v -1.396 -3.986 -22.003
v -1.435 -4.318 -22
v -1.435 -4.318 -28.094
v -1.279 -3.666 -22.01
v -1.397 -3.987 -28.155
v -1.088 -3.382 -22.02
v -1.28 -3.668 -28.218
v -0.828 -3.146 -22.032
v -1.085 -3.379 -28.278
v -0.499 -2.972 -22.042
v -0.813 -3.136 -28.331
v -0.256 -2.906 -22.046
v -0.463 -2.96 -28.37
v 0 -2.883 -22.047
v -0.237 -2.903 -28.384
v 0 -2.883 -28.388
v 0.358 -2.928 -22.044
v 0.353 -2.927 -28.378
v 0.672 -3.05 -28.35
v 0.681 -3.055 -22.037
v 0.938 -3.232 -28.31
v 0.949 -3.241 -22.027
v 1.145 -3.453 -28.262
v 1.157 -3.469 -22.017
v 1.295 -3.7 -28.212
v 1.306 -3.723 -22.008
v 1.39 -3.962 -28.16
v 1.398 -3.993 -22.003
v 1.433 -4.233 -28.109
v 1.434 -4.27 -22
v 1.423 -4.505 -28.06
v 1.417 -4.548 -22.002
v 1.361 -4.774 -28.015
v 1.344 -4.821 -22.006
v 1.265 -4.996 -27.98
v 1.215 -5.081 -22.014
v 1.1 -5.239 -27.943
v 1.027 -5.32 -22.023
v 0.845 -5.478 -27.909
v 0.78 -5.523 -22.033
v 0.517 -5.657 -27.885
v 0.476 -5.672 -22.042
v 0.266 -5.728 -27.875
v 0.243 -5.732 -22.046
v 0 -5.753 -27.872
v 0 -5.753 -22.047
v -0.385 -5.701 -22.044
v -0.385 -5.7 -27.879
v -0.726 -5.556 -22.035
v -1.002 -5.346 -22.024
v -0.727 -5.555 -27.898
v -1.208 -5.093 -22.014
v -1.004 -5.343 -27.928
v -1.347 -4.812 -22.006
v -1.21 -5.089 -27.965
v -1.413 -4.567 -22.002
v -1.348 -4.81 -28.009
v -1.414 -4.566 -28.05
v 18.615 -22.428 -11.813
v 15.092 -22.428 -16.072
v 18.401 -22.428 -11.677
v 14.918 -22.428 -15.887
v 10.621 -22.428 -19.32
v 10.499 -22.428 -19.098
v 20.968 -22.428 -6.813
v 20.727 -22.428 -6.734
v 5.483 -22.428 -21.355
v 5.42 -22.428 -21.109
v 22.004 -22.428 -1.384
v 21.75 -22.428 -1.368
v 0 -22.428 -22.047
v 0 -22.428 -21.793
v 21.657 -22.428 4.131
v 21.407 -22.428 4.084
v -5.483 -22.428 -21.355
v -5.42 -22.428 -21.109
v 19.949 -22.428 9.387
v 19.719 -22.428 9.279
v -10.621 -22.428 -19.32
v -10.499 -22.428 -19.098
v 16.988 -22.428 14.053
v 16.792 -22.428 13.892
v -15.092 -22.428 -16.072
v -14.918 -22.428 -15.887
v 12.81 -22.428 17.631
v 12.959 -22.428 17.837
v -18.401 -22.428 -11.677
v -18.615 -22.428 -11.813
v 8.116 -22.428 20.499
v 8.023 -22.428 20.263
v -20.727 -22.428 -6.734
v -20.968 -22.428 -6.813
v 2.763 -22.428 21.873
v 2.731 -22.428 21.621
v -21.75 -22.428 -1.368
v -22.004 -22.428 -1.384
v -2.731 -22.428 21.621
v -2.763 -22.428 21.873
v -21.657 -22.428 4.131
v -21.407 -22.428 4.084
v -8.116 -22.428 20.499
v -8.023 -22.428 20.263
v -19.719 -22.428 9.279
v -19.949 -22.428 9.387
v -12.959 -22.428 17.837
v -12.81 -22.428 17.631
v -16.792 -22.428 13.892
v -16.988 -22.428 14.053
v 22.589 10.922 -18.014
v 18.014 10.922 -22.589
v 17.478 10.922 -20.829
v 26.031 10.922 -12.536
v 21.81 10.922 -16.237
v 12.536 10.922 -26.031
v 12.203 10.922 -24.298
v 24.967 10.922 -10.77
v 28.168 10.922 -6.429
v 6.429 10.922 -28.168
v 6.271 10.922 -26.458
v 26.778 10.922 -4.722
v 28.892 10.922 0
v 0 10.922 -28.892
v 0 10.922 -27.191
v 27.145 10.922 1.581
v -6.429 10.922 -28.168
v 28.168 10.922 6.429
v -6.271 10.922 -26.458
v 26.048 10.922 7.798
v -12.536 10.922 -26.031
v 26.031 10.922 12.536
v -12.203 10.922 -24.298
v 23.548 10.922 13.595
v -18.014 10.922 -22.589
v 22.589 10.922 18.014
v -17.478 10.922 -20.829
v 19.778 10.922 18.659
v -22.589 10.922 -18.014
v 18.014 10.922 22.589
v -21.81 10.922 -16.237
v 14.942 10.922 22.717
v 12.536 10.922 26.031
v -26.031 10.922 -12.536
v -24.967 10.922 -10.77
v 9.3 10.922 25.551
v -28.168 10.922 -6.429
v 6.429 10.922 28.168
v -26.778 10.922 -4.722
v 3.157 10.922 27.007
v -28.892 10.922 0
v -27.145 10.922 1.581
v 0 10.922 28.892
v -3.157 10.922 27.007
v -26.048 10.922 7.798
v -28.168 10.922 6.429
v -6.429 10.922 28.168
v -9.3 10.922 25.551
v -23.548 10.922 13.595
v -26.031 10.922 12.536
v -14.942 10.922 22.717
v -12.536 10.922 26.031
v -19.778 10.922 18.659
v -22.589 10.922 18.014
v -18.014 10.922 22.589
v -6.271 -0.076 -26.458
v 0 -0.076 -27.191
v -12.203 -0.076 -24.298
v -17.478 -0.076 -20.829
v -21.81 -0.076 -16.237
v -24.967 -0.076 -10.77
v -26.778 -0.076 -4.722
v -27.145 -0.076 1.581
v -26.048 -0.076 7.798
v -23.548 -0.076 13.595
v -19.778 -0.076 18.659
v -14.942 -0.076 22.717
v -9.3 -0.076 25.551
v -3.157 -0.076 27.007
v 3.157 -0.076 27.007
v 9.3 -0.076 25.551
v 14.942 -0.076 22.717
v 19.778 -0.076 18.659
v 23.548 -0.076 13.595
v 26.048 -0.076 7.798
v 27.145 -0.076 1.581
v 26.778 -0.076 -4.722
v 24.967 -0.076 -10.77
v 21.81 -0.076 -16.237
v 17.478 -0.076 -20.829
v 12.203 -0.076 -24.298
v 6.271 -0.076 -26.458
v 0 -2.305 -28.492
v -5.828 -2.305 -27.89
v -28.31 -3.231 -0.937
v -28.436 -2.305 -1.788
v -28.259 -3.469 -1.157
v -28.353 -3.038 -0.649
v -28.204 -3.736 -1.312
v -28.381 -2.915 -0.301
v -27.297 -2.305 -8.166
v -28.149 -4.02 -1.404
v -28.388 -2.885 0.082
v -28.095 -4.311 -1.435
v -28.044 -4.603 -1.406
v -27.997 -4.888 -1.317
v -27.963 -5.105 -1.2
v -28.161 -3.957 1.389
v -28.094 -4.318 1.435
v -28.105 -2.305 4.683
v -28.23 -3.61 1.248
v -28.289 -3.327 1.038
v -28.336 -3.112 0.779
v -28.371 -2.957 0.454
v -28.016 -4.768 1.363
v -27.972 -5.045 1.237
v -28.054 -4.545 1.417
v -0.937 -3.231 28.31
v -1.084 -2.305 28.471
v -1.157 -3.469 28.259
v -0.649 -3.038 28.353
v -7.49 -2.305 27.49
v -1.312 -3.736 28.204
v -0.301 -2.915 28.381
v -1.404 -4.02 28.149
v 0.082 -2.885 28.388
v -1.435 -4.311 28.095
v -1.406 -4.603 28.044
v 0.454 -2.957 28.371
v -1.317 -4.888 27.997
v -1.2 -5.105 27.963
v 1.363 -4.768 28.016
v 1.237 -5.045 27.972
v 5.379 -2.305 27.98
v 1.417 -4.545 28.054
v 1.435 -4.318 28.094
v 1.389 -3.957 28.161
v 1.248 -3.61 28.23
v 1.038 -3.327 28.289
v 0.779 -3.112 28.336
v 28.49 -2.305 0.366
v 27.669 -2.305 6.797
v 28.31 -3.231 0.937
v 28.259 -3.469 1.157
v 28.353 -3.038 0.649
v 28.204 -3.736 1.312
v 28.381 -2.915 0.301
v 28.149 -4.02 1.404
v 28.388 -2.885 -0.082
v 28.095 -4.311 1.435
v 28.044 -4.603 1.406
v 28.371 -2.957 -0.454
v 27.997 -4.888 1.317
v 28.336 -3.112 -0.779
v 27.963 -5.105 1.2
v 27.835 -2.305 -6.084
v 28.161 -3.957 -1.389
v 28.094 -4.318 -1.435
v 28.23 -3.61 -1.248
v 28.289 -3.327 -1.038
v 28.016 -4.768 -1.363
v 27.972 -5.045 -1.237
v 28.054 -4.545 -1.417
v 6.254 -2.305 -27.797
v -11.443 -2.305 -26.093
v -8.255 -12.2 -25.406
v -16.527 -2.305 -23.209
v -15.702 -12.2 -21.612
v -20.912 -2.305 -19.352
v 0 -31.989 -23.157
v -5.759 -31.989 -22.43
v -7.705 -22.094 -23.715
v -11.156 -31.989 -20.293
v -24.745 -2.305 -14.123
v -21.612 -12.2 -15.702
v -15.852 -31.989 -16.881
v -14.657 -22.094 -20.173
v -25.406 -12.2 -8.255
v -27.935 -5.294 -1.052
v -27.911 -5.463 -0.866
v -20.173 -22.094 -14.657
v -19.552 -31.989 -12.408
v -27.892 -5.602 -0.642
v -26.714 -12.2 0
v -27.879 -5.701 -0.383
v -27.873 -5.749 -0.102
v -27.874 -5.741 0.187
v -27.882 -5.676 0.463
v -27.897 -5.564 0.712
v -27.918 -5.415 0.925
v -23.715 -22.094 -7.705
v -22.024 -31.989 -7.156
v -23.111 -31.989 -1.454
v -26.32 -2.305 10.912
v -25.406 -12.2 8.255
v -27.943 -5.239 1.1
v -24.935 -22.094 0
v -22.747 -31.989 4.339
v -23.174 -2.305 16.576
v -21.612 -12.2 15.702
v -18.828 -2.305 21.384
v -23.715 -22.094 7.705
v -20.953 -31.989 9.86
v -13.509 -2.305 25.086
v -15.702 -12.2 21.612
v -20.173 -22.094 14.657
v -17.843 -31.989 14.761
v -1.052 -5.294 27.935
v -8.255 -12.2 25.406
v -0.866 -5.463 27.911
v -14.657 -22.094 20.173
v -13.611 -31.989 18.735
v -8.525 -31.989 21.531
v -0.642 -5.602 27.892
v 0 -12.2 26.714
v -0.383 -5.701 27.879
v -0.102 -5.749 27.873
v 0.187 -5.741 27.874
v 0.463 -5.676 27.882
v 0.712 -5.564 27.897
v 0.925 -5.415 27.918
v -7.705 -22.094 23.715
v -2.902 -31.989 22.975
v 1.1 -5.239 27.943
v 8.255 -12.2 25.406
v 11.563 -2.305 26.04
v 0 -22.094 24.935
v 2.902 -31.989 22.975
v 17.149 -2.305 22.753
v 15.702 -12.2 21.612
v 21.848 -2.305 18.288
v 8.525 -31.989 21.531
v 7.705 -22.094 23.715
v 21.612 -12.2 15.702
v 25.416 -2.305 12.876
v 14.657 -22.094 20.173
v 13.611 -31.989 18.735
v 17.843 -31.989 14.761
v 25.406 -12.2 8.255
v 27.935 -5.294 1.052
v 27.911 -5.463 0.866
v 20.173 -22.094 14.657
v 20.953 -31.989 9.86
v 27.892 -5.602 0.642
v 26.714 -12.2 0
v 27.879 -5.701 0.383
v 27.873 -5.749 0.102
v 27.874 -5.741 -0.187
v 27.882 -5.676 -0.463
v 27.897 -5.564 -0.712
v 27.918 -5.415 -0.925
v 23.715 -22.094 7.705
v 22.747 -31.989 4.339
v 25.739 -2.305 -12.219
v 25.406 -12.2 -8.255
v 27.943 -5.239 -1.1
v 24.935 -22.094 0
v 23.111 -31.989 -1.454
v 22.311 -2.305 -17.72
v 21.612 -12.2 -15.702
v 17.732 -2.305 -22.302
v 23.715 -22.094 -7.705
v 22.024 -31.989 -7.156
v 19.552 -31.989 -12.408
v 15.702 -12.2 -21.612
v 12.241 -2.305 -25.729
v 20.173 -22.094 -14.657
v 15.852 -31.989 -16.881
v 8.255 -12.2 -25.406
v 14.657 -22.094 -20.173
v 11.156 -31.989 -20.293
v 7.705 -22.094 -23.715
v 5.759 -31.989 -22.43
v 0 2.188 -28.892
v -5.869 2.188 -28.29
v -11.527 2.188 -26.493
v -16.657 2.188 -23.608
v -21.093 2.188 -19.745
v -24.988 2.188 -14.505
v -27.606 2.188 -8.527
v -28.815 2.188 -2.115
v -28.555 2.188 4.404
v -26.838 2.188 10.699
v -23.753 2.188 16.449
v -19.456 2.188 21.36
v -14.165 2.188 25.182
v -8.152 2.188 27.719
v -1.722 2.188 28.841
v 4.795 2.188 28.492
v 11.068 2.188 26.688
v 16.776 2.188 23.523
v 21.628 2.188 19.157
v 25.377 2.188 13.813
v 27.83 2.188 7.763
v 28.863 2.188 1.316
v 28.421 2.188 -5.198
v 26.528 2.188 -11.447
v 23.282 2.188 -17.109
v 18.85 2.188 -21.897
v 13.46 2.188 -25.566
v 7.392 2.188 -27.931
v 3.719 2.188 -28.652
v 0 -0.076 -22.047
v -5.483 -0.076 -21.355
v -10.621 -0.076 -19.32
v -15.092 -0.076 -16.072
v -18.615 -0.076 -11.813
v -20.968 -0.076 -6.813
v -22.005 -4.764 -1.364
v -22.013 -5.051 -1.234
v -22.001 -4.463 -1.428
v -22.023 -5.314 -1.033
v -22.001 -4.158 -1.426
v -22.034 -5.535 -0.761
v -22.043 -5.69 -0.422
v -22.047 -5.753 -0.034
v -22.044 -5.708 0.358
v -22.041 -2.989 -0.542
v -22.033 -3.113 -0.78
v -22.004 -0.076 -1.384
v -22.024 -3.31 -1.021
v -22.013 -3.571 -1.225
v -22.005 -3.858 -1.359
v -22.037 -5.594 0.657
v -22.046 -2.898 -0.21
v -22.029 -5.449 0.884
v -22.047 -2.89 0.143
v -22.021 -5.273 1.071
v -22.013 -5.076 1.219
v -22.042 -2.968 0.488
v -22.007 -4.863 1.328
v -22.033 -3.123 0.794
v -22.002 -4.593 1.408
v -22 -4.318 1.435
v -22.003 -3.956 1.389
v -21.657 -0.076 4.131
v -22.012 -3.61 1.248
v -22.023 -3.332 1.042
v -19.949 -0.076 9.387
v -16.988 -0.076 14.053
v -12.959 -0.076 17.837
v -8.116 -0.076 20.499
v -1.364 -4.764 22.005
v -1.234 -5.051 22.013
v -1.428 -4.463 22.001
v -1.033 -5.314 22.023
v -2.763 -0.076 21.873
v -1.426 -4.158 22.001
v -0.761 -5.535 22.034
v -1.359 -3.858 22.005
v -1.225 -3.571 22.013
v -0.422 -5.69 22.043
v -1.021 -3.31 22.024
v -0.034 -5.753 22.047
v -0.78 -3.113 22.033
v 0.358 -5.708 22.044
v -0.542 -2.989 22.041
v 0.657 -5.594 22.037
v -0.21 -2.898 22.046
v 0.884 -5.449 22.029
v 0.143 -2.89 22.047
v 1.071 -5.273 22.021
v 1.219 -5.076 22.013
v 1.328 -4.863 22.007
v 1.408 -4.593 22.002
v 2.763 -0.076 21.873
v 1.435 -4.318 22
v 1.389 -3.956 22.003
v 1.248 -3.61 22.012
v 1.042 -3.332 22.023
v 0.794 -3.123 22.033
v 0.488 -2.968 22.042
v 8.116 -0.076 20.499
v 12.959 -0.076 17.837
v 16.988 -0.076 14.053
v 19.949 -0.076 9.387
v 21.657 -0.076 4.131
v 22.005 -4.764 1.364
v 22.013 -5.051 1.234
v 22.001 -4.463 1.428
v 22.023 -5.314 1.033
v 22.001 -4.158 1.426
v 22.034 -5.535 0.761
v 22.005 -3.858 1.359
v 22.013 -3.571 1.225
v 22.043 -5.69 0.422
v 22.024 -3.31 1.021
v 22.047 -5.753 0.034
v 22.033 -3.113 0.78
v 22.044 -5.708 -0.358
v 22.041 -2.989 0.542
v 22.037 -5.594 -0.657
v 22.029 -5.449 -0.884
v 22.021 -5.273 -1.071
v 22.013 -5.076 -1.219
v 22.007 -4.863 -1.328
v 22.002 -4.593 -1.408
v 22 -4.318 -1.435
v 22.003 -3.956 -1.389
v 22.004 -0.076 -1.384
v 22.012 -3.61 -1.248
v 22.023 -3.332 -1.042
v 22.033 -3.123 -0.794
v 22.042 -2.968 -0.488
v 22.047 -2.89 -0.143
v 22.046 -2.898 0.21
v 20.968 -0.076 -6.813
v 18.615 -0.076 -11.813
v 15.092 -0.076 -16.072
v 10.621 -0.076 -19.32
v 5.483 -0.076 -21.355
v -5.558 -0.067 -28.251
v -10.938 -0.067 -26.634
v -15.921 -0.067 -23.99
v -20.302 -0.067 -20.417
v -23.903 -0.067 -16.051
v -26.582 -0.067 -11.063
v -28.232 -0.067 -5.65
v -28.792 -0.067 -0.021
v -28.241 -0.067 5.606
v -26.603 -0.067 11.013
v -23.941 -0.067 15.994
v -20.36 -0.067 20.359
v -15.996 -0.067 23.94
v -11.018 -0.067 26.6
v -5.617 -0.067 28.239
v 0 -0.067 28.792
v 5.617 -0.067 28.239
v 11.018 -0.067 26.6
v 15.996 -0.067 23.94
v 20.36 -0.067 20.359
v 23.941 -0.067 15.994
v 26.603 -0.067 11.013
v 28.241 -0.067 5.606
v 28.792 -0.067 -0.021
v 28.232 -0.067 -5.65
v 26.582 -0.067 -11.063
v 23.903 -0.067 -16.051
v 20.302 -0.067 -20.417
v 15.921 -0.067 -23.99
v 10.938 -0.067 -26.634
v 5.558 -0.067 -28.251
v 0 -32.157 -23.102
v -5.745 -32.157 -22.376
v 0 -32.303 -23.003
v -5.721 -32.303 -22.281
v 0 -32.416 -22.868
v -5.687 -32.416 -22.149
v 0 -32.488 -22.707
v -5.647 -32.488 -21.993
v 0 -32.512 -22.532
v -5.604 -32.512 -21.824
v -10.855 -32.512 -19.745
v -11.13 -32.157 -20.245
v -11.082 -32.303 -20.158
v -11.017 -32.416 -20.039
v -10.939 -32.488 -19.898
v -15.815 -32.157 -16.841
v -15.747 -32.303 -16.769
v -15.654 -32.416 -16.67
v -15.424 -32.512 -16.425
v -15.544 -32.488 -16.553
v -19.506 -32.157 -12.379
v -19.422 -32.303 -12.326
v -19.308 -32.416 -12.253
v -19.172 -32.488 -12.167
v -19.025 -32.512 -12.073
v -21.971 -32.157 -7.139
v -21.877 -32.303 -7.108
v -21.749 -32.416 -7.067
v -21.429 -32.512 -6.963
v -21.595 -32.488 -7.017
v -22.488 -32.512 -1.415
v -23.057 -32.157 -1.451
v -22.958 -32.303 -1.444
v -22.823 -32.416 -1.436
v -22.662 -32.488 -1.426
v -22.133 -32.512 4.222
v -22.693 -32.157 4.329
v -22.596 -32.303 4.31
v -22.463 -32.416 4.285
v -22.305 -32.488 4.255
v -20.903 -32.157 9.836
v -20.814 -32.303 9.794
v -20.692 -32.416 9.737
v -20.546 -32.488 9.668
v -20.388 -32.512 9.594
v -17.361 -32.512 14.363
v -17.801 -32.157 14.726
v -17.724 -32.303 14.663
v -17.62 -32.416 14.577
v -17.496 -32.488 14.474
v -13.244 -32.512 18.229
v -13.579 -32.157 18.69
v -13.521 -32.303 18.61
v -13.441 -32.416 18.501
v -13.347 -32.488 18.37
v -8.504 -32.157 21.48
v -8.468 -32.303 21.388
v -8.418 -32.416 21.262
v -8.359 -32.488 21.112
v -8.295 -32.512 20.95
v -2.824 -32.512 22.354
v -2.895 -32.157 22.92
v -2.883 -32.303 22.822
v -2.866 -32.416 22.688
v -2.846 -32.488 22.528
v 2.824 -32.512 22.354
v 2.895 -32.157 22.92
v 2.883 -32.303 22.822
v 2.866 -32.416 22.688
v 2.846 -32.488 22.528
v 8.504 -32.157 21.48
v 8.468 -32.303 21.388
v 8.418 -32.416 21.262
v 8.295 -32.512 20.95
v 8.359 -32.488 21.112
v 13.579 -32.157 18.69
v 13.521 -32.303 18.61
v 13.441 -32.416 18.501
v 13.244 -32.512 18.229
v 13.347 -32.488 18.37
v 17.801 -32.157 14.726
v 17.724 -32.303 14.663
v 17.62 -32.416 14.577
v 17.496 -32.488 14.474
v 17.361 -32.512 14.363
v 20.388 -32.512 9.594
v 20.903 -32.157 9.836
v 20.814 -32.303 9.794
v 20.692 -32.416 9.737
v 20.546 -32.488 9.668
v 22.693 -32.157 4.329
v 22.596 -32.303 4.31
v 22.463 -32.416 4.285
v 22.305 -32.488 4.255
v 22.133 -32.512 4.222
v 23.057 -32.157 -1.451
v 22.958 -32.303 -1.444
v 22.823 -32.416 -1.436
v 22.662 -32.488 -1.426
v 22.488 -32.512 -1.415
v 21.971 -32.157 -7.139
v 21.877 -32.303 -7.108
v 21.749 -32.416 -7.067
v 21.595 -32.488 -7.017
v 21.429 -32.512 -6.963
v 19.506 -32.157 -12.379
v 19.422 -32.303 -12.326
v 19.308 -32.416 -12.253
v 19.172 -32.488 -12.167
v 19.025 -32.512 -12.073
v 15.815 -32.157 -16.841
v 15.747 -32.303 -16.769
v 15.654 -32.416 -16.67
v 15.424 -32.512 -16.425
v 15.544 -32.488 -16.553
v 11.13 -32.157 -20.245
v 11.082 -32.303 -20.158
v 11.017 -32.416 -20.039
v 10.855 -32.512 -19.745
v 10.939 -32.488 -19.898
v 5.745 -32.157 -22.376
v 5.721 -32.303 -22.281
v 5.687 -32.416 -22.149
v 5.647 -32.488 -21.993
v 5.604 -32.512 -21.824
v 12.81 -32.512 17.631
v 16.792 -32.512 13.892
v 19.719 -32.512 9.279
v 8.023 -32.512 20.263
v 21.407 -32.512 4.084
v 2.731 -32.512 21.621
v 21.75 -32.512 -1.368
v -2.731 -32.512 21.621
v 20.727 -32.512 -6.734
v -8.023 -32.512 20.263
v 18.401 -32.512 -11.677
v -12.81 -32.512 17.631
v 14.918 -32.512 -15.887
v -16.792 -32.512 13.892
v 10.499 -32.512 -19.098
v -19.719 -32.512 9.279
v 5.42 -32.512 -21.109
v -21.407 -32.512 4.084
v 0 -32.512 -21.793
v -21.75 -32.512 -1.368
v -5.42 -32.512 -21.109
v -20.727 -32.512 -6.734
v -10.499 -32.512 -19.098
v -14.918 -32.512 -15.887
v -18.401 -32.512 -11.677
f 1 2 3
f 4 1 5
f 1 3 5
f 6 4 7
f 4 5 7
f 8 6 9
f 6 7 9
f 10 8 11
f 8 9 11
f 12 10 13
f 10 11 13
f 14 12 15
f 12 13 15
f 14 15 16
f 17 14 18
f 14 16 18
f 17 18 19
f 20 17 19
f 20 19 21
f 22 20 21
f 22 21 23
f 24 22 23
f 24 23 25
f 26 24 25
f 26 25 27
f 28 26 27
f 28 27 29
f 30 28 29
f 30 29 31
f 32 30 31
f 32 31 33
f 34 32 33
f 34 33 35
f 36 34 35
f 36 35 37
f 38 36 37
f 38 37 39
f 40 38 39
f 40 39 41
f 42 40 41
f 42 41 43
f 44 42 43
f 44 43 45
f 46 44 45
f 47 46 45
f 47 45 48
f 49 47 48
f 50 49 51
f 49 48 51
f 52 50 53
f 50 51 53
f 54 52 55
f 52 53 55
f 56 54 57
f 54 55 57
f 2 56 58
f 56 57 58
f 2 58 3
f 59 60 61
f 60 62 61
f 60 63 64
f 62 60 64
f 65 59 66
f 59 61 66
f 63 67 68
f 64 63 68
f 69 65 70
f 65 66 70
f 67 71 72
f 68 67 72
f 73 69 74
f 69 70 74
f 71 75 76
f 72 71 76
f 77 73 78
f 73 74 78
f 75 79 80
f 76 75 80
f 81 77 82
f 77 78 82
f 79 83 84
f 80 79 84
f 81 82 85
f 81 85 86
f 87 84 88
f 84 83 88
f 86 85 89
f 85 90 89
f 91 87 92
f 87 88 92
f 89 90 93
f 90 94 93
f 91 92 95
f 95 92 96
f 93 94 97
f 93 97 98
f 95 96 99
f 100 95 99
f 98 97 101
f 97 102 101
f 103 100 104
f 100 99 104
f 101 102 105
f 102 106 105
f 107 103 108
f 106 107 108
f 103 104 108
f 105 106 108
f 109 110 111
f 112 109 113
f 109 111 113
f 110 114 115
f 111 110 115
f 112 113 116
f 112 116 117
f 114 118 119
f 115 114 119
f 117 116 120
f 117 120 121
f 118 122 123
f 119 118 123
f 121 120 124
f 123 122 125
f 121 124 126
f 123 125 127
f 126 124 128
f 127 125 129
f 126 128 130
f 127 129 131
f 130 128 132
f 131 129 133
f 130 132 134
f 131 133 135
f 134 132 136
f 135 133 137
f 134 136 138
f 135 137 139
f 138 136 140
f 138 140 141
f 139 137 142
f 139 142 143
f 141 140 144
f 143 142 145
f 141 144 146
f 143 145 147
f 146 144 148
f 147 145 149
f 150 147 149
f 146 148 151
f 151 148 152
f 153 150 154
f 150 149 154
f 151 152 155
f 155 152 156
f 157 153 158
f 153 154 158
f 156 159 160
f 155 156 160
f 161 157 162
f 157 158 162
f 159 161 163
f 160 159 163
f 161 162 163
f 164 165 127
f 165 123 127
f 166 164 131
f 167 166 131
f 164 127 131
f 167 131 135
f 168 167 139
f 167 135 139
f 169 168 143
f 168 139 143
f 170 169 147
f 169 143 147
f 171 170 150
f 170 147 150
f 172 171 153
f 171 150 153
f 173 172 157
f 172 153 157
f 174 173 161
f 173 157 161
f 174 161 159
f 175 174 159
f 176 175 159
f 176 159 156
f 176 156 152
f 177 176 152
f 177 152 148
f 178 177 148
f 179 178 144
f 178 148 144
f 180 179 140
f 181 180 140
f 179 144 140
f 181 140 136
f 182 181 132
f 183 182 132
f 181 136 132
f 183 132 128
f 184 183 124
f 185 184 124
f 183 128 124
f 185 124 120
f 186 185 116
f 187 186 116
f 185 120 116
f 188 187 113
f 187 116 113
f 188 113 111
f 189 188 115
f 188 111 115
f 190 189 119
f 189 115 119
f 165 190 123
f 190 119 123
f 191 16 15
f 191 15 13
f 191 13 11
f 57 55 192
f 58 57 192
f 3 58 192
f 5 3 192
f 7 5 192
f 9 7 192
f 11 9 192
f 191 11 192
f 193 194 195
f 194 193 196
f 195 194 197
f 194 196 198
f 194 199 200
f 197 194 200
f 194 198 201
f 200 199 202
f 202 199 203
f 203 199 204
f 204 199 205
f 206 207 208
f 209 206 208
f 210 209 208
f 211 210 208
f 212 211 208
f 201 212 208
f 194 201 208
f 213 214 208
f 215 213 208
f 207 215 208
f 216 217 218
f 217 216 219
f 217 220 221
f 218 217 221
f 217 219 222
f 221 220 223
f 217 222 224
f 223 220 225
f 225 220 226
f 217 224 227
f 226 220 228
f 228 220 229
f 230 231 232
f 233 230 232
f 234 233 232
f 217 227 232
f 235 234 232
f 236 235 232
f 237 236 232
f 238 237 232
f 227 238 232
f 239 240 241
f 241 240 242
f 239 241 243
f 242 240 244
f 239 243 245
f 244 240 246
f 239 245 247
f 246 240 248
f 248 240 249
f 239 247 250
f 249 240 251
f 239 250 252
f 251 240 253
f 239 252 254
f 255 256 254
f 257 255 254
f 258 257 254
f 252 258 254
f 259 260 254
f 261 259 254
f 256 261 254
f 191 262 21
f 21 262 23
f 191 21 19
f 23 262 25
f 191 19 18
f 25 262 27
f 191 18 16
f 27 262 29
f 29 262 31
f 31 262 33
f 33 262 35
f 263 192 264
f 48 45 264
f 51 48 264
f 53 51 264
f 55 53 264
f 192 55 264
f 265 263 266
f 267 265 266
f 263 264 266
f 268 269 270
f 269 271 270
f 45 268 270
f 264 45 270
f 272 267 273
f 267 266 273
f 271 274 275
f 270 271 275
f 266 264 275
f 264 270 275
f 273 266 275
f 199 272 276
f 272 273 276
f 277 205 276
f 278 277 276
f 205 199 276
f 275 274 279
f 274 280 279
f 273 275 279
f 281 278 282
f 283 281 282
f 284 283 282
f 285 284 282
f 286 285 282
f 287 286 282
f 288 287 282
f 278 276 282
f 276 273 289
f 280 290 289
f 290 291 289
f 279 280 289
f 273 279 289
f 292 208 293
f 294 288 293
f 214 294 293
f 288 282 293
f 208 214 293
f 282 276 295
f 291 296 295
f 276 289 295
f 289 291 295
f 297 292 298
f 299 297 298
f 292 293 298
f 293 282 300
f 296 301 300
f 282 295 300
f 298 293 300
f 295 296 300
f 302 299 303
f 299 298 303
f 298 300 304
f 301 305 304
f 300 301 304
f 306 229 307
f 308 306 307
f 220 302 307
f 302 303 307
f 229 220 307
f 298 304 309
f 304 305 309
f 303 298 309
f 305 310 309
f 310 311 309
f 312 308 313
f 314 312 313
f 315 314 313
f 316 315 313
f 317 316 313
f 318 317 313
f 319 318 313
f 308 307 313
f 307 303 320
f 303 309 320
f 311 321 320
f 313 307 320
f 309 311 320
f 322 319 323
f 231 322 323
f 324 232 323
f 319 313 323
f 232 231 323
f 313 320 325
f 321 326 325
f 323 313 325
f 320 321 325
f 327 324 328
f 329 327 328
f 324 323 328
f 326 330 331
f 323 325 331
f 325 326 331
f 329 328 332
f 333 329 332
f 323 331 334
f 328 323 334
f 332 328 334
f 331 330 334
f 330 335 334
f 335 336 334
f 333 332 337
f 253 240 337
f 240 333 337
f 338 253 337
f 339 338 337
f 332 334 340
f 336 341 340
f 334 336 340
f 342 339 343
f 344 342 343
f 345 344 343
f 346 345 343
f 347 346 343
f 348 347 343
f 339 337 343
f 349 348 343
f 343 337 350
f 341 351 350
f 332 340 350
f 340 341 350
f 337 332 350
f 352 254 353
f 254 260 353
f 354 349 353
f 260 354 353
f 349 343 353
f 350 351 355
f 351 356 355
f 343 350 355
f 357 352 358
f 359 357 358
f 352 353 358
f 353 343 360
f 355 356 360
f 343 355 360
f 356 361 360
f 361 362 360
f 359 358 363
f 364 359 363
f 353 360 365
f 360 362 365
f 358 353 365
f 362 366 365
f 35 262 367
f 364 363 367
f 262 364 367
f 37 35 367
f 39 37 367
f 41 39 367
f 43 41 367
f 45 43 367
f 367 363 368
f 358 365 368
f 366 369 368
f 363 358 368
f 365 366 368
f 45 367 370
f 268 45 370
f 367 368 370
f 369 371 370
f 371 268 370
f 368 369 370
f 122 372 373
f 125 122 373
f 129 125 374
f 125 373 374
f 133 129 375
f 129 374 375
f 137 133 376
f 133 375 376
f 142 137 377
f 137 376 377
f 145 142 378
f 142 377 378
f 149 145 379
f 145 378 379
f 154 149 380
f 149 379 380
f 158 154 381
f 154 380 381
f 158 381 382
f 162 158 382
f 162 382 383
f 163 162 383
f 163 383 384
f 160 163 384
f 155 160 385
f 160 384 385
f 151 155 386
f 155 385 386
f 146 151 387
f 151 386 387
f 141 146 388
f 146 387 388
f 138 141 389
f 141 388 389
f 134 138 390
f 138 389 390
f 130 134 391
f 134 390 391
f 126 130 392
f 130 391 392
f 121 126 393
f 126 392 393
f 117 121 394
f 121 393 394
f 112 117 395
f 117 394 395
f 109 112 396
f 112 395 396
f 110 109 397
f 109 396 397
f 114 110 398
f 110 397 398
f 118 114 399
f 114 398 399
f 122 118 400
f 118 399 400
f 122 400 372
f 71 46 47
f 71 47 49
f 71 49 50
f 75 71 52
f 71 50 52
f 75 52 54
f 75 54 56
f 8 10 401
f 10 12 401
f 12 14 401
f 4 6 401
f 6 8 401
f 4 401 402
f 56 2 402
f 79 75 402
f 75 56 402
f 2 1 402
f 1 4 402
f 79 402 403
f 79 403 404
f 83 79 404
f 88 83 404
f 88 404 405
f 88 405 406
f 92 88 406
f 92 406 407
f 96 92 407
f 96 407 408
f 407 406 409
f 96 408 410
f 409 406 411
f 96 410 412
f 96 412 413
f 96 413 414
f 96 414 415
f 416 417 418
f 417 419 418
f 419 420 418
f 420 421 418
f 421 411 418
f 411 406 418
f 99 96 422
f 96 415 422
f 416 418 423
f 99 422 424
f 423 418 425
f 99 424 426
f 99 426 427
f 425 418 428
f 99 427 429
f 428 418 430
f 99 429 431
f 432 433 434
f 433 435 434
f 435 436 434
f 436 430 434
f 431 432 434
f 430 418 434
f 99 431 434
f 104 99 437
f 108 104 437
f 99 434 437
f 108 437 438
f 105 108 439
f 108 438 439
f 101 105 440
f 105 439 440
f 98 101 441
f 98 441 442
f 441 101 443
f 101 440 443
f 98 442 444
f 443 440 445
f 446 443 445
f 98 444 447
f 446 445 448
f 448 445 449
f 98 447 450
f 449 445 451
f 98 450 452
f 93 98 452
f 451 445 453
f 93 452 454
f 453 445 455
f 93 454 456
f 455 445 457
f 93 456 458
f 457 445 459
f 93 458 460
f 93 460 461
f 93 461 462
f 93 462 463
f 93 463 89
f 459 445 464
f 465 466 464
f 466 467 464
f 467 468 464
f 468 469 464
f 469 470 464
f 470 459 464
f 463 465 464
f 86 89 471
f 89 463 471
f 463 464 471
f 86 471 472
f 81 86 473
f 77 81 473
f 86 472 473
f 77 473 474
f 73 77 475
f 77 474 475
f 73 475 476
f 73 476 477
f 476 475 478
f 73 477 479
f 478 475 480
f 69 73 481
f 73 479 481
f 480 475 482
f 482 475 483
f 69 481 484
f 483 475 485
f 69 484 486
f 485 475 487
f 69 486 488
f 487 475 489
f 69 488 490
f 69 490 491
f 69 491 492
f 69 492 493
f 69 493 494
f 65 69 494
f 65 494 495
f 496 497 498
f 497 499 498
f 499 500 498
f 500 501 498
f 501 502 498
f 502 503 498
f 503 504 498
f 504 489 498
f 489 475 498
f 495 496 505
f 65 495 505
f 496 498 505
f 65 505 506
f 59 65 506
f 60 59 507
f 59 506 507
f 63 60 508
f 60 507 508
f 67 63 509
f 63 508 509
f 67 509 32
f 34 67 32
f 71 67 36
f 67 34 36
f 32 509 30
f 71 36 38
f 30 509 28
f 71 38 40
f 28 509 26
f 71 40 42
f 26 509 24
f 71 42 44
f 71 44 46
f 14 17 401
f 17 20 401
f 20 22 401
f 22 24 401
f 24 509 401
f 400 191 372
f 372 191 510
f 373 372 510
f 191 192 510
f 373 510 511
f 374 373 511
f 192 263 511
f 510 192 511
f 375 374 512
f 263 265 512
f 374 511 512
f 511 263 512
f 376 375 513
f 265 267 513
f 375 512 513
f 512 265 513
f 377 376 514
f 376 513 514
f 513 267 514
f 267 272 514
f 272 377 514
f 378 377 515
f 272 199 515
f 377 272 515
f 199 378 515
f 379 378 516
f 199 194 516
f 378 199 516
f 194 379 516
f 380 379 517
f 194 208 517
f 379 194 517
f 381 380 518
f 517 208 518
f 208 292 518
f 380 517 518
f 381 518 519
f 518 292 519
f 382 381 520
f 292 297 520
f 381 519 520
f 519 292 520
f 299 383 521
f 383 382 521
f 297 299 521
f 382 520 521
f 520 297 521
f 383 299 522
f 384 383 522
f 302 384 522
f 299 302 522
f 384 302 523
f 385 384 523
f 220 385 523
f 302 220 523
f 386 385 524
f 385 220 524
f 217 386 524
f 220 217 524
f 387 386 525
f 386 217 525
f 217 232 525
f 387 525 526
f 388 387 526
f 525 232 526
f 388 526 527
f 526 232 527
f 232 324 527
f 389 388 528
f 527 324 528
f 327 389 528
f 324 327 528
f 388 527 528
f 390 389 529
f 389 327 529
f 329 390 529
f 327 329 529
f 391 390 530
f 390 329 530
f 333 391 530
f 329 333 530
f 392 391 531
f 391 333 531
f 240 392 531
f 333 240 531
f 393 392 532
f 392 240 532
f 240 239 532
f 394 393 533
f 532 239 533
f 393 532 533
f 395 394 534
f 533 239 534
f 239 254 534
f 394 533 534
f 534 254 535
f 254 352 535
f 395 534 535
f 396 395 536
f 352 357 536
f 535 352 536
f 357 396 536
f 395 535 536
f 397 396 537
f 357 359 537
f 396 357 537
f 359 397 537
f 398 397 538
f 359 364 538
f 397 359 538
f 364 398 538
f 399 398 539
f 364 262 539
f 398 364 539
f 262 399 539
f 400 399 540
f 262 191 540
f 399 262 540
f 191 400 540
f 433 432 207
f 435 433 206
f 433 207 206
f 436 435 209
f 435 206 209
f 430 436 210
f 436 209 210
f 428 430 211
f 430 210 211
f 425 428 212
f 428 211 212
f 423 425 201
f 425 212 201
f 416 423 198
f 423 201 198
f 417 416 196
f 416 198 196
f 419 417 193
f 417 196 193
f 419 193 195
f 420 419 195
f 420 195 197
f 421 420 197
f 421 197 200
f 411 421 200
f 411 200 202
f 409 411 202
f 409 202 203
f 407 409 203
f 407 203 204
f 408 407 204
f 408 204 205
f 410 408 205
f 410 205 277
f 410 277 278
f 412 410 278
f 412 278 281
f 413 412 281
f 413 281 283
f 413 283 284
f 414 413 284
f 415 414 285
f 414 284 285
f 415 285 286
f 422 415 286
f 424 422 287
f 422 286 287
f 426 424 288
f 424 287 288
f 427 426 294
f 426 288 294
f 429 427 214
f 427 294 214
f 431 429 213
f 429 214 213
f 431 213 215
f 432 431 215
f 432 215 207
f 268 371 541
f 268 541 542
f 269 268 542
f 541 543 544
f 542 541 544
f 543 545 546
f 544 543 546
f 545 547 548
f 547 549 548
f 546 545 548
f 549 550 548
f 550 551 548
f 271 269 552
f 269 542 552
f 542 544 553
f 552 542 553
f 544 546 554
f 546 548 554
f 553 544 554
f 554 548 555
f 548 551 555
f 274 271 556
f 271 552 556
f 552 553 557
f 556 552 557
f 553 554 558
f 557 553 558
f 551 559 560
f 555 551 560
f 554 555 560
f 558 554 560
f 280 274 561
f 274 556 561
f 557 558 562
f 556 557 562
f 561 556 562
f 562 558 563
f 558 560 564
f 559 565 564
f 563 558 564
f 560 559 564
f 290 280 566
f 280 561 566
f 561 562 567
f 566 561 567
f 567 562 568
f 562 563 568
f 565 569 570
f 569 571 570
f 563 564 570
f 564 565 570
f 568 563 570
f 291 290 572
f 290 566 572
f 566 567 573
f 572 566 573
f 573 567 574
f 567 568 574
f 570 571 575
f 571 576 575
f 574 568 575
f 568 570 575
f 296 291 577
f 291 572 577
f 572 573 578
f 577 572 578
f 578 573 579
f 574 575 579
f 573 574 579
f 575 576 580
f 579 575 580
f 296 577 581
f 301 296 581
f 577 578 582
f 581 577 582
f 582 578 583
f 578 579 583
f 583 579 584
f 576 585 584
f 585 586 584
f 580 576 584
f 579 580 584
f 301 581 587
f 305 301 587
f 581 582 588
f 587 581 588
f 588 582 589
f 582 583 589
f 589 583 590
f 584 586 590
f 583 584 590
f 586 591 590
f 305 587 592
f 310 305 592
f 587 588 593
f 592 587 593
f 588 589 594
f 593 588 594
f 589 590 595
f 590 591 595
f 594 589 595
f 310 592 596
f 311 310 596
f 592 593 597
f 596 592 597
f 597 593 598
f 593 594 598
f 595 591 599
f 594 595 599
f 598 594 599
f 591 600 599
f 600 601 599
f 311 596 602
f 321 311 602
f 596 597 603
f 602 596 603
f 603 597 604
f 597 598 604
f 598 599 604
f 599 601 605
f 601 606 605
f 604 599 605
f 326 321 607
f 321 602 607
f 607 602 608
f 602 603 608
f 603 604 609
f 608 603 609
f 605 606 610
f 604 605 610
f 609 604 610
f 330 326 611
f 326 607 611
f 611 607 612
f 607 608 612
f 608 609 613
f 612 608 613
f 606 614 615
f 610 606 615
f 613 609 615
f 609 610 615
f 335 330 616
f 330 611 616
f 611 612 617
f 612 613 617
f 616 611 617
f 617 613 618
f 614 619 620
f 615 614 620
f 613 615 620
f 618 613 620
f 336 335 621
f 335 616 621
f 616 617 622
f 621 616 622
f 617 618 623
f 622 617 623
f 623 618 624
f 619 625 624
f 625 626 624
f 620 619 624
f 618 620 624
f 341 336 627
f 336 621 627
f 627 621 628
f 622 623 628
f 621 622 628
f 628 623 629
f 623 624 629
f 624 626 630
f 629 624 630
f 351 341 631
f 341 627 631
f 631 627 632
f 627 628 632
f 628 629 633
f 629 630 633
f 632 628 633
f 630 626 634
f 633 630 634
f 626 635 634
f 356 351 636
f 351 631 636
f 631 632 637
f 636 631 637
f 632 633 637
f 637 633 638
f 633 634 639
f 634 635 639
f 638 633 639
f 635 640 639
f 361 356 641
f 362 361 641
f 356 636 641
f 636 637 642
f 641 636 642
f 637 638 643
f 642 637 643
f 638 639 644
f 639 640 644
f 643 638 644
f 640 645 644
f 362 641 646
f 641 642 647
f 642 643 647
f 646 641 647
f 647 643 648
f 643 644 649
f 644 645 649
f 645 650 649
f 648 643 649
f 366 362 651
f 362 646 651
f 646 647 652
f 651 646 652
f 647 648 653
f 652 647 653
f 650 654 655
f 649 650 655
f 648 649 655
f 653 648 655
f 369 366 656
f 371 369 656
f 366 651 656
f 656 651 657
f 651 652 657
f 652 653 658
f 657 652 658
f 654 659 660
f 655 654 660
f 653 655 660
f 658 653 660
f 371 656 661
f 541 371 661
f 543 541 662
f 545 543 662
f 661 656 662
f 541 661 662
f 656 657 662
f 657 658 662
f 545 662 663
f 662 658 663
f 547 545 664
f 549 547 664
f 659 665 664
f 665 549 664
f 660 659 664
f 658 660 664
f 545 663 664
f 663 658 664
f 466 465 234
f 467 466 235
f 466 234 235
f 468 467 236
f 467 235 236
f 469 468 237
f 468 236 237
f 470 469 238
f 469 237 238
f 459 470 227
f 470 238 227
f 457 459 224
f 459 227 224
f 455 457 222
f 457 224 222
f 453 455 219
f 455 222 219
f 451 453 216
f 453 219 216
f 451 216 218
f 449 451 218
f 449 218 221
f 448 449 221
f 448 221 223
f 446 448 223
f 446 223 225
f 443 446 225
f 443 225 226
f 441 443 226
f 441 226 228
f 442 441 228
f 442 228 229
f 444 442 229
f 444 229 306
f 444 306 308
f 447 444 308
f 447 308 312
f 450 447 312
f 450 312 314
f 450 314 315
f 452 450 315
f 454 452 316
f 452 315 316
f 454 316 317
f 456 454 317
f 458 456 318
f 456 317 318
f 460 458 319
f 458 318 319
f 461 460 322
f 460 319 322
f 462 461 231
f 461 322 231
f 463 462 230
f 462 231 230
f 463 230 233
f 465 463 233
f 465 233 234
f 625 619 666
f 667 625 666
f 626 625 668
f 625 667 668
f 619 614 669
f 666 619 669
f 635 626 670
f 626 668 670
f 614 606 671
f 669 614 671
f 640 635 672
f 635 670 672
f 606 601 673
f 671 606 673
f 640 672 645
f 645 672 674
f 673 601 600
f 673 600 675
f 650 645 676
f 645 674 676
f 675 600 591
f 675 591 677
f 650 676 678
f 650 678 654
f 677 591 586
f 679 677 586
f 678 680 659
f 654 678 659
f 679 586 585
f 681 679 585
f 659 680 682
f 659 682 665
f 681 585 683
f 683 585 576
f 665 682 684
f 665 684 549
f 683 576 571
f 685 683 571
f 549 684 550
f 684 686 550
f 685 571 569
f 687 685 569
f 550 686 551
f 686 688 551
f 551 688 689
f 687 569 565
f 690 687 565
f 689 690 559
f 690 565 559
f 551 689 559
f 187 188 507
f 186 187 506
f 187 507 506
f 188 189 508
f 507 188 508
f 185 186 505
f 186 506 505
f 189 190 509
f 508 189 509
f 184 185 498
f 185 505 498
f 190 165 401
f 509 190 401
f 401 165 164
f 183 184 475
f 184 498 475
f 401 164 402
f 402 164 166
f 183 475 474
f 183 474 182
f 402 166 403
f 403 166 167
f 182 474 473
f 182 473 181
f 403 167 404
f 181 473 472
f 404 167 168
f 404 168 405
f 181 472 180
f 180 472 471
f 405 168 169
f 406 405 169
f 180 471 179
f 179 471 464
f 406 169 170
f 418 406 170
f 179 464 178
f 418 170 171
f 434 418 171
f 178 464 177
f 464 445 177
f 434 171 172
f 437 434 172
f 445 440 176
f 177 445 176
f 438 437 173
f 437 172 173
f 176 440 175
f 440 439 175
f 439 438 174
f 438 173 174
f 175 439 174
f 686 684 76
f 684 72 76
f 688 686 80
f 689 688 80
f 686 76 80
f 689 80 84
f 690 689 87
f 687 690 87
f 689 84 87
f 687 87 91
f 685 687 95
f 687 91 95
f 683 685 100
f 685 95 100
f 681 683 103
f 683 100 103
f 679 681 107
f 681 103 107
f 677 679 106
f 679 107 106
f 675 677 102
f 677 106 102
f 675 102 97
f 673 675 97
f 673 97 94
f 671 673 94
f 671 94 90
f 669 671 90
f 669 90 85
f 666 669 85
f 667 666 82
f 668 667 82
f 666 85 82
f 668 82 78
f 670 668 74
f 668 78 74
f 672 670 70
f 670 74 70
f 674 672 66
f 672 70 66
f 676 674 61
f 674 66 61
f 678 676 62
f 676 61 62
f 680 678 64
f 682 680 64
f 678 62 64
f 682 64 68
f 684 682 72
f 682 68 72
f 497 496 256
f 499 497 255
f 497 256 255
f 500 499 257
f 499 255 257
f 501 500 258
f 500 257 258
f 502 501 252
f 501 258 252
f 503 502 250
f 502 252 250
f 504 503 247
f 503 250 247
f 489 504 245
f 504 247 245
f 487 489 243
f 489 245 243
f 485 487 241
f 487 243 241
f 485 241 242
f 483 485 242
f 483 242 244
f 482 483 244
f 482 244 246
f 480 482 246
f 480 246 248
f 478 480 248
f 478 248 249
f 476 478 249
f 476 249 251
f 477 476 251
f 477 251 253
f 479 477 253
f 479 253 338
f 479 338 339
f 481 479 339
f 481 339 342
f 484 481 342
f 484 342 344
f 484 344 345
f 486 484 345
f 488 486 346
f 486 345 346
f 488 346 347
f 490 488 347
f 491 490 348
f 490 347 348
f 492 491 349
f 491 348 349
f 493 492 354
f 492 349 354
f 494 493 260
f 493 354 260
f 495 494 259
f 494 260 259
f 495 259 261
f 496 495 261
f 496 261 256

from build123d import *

# Parameters (mm, degrees)
F_6_40_TAPPED_HOLE1_REACH  = 74.325
F_6_40_TAPPED_HOLE1_BORE_R = 1.4351
CIRPATTERN1_COUNT          = 4
FILLET1_R                  = 0.635
FILLET2_R                  = 25.4


with BuildPart() as part:
    # Sketch2 → Revolve1 (revolve)
    with BuildSketch(Plane.XY, mode=Mode.PRIVATE) as revolve1_sk:
        Polygon((22.0472, -22.4282), (22.0472, -0.0762), (27.1907, -0.0762), (27.1907, 10.922), (28.8925, 10.922), (28.8925, -0.0762), (23.0632, -32.512), (21.7932, -32.512), (21.7932, -22.4282), align=None)
    revolve(revolve1_sk.sketch.rotate(Axis((0, -34.5451, 0), (0, 1, 0)), 90), axis=Axis((0, -34.5451, 0), (0, 1, 0)))

    # #6-40 Tapped Hole1 bore → #6-40 Tapped Hole1 (cut, up to next)
    with BuildSketch(Plane.XY.offset(28.8925), mode=Mode.PRIVATE) as f_6_40_tapped_hole1_sk1:
        with Locations((0, -4.318)):
            Circle(F_6_40_TAPPED_HOLE1_BORE_R)
    f_6_40_tapped_hole1_tool1 = extrude(f_6_40_tapped_hole1_sk1.sketch, amount=-F_6_40_TAPPED_HOLE1_REACH, mode=Mode.PRIVATE) & part.part
    f_6_40_tapped_hole1 = f_6_40_tapped_hole1_tool1.solids().sort_by_distance((0, -4.318, 28.8925))[0]
    add(f_6_40_tapped_hole1, mode=Mode.SUBTRACT)

    # CirPattern1: #6-40 Tapped Hole1 ×4 about axis
    cirpattern1_axis = Axis((0, -34.5451, 0), (0, -1, 0))
    for i in range(1, CIRPATTERN1_COUNT):
        add(f_6_40_tapped_hole1.rotate(cirpattern1_axis, i * 360 / CIRPATTERN1_COUNT), mode=Mode.SUBTRACT)

    # Fillet1
    fillet1_edges = [part.edges().sort_by_distance(p)[0] for p in [
        (0, -32.512, 23.0632),
    ]]
    fillet(fillet1_edges, radius=FILLET1_R)

    # Fillet2
    fillet2_edges = [part.edges().sort_by_distance(p)[0] for p in [
        (0, -0.0762, 28.8925),
    ]]
    fillet(fillet2_edges, radius=FILLET2_R)


solid = part.part
